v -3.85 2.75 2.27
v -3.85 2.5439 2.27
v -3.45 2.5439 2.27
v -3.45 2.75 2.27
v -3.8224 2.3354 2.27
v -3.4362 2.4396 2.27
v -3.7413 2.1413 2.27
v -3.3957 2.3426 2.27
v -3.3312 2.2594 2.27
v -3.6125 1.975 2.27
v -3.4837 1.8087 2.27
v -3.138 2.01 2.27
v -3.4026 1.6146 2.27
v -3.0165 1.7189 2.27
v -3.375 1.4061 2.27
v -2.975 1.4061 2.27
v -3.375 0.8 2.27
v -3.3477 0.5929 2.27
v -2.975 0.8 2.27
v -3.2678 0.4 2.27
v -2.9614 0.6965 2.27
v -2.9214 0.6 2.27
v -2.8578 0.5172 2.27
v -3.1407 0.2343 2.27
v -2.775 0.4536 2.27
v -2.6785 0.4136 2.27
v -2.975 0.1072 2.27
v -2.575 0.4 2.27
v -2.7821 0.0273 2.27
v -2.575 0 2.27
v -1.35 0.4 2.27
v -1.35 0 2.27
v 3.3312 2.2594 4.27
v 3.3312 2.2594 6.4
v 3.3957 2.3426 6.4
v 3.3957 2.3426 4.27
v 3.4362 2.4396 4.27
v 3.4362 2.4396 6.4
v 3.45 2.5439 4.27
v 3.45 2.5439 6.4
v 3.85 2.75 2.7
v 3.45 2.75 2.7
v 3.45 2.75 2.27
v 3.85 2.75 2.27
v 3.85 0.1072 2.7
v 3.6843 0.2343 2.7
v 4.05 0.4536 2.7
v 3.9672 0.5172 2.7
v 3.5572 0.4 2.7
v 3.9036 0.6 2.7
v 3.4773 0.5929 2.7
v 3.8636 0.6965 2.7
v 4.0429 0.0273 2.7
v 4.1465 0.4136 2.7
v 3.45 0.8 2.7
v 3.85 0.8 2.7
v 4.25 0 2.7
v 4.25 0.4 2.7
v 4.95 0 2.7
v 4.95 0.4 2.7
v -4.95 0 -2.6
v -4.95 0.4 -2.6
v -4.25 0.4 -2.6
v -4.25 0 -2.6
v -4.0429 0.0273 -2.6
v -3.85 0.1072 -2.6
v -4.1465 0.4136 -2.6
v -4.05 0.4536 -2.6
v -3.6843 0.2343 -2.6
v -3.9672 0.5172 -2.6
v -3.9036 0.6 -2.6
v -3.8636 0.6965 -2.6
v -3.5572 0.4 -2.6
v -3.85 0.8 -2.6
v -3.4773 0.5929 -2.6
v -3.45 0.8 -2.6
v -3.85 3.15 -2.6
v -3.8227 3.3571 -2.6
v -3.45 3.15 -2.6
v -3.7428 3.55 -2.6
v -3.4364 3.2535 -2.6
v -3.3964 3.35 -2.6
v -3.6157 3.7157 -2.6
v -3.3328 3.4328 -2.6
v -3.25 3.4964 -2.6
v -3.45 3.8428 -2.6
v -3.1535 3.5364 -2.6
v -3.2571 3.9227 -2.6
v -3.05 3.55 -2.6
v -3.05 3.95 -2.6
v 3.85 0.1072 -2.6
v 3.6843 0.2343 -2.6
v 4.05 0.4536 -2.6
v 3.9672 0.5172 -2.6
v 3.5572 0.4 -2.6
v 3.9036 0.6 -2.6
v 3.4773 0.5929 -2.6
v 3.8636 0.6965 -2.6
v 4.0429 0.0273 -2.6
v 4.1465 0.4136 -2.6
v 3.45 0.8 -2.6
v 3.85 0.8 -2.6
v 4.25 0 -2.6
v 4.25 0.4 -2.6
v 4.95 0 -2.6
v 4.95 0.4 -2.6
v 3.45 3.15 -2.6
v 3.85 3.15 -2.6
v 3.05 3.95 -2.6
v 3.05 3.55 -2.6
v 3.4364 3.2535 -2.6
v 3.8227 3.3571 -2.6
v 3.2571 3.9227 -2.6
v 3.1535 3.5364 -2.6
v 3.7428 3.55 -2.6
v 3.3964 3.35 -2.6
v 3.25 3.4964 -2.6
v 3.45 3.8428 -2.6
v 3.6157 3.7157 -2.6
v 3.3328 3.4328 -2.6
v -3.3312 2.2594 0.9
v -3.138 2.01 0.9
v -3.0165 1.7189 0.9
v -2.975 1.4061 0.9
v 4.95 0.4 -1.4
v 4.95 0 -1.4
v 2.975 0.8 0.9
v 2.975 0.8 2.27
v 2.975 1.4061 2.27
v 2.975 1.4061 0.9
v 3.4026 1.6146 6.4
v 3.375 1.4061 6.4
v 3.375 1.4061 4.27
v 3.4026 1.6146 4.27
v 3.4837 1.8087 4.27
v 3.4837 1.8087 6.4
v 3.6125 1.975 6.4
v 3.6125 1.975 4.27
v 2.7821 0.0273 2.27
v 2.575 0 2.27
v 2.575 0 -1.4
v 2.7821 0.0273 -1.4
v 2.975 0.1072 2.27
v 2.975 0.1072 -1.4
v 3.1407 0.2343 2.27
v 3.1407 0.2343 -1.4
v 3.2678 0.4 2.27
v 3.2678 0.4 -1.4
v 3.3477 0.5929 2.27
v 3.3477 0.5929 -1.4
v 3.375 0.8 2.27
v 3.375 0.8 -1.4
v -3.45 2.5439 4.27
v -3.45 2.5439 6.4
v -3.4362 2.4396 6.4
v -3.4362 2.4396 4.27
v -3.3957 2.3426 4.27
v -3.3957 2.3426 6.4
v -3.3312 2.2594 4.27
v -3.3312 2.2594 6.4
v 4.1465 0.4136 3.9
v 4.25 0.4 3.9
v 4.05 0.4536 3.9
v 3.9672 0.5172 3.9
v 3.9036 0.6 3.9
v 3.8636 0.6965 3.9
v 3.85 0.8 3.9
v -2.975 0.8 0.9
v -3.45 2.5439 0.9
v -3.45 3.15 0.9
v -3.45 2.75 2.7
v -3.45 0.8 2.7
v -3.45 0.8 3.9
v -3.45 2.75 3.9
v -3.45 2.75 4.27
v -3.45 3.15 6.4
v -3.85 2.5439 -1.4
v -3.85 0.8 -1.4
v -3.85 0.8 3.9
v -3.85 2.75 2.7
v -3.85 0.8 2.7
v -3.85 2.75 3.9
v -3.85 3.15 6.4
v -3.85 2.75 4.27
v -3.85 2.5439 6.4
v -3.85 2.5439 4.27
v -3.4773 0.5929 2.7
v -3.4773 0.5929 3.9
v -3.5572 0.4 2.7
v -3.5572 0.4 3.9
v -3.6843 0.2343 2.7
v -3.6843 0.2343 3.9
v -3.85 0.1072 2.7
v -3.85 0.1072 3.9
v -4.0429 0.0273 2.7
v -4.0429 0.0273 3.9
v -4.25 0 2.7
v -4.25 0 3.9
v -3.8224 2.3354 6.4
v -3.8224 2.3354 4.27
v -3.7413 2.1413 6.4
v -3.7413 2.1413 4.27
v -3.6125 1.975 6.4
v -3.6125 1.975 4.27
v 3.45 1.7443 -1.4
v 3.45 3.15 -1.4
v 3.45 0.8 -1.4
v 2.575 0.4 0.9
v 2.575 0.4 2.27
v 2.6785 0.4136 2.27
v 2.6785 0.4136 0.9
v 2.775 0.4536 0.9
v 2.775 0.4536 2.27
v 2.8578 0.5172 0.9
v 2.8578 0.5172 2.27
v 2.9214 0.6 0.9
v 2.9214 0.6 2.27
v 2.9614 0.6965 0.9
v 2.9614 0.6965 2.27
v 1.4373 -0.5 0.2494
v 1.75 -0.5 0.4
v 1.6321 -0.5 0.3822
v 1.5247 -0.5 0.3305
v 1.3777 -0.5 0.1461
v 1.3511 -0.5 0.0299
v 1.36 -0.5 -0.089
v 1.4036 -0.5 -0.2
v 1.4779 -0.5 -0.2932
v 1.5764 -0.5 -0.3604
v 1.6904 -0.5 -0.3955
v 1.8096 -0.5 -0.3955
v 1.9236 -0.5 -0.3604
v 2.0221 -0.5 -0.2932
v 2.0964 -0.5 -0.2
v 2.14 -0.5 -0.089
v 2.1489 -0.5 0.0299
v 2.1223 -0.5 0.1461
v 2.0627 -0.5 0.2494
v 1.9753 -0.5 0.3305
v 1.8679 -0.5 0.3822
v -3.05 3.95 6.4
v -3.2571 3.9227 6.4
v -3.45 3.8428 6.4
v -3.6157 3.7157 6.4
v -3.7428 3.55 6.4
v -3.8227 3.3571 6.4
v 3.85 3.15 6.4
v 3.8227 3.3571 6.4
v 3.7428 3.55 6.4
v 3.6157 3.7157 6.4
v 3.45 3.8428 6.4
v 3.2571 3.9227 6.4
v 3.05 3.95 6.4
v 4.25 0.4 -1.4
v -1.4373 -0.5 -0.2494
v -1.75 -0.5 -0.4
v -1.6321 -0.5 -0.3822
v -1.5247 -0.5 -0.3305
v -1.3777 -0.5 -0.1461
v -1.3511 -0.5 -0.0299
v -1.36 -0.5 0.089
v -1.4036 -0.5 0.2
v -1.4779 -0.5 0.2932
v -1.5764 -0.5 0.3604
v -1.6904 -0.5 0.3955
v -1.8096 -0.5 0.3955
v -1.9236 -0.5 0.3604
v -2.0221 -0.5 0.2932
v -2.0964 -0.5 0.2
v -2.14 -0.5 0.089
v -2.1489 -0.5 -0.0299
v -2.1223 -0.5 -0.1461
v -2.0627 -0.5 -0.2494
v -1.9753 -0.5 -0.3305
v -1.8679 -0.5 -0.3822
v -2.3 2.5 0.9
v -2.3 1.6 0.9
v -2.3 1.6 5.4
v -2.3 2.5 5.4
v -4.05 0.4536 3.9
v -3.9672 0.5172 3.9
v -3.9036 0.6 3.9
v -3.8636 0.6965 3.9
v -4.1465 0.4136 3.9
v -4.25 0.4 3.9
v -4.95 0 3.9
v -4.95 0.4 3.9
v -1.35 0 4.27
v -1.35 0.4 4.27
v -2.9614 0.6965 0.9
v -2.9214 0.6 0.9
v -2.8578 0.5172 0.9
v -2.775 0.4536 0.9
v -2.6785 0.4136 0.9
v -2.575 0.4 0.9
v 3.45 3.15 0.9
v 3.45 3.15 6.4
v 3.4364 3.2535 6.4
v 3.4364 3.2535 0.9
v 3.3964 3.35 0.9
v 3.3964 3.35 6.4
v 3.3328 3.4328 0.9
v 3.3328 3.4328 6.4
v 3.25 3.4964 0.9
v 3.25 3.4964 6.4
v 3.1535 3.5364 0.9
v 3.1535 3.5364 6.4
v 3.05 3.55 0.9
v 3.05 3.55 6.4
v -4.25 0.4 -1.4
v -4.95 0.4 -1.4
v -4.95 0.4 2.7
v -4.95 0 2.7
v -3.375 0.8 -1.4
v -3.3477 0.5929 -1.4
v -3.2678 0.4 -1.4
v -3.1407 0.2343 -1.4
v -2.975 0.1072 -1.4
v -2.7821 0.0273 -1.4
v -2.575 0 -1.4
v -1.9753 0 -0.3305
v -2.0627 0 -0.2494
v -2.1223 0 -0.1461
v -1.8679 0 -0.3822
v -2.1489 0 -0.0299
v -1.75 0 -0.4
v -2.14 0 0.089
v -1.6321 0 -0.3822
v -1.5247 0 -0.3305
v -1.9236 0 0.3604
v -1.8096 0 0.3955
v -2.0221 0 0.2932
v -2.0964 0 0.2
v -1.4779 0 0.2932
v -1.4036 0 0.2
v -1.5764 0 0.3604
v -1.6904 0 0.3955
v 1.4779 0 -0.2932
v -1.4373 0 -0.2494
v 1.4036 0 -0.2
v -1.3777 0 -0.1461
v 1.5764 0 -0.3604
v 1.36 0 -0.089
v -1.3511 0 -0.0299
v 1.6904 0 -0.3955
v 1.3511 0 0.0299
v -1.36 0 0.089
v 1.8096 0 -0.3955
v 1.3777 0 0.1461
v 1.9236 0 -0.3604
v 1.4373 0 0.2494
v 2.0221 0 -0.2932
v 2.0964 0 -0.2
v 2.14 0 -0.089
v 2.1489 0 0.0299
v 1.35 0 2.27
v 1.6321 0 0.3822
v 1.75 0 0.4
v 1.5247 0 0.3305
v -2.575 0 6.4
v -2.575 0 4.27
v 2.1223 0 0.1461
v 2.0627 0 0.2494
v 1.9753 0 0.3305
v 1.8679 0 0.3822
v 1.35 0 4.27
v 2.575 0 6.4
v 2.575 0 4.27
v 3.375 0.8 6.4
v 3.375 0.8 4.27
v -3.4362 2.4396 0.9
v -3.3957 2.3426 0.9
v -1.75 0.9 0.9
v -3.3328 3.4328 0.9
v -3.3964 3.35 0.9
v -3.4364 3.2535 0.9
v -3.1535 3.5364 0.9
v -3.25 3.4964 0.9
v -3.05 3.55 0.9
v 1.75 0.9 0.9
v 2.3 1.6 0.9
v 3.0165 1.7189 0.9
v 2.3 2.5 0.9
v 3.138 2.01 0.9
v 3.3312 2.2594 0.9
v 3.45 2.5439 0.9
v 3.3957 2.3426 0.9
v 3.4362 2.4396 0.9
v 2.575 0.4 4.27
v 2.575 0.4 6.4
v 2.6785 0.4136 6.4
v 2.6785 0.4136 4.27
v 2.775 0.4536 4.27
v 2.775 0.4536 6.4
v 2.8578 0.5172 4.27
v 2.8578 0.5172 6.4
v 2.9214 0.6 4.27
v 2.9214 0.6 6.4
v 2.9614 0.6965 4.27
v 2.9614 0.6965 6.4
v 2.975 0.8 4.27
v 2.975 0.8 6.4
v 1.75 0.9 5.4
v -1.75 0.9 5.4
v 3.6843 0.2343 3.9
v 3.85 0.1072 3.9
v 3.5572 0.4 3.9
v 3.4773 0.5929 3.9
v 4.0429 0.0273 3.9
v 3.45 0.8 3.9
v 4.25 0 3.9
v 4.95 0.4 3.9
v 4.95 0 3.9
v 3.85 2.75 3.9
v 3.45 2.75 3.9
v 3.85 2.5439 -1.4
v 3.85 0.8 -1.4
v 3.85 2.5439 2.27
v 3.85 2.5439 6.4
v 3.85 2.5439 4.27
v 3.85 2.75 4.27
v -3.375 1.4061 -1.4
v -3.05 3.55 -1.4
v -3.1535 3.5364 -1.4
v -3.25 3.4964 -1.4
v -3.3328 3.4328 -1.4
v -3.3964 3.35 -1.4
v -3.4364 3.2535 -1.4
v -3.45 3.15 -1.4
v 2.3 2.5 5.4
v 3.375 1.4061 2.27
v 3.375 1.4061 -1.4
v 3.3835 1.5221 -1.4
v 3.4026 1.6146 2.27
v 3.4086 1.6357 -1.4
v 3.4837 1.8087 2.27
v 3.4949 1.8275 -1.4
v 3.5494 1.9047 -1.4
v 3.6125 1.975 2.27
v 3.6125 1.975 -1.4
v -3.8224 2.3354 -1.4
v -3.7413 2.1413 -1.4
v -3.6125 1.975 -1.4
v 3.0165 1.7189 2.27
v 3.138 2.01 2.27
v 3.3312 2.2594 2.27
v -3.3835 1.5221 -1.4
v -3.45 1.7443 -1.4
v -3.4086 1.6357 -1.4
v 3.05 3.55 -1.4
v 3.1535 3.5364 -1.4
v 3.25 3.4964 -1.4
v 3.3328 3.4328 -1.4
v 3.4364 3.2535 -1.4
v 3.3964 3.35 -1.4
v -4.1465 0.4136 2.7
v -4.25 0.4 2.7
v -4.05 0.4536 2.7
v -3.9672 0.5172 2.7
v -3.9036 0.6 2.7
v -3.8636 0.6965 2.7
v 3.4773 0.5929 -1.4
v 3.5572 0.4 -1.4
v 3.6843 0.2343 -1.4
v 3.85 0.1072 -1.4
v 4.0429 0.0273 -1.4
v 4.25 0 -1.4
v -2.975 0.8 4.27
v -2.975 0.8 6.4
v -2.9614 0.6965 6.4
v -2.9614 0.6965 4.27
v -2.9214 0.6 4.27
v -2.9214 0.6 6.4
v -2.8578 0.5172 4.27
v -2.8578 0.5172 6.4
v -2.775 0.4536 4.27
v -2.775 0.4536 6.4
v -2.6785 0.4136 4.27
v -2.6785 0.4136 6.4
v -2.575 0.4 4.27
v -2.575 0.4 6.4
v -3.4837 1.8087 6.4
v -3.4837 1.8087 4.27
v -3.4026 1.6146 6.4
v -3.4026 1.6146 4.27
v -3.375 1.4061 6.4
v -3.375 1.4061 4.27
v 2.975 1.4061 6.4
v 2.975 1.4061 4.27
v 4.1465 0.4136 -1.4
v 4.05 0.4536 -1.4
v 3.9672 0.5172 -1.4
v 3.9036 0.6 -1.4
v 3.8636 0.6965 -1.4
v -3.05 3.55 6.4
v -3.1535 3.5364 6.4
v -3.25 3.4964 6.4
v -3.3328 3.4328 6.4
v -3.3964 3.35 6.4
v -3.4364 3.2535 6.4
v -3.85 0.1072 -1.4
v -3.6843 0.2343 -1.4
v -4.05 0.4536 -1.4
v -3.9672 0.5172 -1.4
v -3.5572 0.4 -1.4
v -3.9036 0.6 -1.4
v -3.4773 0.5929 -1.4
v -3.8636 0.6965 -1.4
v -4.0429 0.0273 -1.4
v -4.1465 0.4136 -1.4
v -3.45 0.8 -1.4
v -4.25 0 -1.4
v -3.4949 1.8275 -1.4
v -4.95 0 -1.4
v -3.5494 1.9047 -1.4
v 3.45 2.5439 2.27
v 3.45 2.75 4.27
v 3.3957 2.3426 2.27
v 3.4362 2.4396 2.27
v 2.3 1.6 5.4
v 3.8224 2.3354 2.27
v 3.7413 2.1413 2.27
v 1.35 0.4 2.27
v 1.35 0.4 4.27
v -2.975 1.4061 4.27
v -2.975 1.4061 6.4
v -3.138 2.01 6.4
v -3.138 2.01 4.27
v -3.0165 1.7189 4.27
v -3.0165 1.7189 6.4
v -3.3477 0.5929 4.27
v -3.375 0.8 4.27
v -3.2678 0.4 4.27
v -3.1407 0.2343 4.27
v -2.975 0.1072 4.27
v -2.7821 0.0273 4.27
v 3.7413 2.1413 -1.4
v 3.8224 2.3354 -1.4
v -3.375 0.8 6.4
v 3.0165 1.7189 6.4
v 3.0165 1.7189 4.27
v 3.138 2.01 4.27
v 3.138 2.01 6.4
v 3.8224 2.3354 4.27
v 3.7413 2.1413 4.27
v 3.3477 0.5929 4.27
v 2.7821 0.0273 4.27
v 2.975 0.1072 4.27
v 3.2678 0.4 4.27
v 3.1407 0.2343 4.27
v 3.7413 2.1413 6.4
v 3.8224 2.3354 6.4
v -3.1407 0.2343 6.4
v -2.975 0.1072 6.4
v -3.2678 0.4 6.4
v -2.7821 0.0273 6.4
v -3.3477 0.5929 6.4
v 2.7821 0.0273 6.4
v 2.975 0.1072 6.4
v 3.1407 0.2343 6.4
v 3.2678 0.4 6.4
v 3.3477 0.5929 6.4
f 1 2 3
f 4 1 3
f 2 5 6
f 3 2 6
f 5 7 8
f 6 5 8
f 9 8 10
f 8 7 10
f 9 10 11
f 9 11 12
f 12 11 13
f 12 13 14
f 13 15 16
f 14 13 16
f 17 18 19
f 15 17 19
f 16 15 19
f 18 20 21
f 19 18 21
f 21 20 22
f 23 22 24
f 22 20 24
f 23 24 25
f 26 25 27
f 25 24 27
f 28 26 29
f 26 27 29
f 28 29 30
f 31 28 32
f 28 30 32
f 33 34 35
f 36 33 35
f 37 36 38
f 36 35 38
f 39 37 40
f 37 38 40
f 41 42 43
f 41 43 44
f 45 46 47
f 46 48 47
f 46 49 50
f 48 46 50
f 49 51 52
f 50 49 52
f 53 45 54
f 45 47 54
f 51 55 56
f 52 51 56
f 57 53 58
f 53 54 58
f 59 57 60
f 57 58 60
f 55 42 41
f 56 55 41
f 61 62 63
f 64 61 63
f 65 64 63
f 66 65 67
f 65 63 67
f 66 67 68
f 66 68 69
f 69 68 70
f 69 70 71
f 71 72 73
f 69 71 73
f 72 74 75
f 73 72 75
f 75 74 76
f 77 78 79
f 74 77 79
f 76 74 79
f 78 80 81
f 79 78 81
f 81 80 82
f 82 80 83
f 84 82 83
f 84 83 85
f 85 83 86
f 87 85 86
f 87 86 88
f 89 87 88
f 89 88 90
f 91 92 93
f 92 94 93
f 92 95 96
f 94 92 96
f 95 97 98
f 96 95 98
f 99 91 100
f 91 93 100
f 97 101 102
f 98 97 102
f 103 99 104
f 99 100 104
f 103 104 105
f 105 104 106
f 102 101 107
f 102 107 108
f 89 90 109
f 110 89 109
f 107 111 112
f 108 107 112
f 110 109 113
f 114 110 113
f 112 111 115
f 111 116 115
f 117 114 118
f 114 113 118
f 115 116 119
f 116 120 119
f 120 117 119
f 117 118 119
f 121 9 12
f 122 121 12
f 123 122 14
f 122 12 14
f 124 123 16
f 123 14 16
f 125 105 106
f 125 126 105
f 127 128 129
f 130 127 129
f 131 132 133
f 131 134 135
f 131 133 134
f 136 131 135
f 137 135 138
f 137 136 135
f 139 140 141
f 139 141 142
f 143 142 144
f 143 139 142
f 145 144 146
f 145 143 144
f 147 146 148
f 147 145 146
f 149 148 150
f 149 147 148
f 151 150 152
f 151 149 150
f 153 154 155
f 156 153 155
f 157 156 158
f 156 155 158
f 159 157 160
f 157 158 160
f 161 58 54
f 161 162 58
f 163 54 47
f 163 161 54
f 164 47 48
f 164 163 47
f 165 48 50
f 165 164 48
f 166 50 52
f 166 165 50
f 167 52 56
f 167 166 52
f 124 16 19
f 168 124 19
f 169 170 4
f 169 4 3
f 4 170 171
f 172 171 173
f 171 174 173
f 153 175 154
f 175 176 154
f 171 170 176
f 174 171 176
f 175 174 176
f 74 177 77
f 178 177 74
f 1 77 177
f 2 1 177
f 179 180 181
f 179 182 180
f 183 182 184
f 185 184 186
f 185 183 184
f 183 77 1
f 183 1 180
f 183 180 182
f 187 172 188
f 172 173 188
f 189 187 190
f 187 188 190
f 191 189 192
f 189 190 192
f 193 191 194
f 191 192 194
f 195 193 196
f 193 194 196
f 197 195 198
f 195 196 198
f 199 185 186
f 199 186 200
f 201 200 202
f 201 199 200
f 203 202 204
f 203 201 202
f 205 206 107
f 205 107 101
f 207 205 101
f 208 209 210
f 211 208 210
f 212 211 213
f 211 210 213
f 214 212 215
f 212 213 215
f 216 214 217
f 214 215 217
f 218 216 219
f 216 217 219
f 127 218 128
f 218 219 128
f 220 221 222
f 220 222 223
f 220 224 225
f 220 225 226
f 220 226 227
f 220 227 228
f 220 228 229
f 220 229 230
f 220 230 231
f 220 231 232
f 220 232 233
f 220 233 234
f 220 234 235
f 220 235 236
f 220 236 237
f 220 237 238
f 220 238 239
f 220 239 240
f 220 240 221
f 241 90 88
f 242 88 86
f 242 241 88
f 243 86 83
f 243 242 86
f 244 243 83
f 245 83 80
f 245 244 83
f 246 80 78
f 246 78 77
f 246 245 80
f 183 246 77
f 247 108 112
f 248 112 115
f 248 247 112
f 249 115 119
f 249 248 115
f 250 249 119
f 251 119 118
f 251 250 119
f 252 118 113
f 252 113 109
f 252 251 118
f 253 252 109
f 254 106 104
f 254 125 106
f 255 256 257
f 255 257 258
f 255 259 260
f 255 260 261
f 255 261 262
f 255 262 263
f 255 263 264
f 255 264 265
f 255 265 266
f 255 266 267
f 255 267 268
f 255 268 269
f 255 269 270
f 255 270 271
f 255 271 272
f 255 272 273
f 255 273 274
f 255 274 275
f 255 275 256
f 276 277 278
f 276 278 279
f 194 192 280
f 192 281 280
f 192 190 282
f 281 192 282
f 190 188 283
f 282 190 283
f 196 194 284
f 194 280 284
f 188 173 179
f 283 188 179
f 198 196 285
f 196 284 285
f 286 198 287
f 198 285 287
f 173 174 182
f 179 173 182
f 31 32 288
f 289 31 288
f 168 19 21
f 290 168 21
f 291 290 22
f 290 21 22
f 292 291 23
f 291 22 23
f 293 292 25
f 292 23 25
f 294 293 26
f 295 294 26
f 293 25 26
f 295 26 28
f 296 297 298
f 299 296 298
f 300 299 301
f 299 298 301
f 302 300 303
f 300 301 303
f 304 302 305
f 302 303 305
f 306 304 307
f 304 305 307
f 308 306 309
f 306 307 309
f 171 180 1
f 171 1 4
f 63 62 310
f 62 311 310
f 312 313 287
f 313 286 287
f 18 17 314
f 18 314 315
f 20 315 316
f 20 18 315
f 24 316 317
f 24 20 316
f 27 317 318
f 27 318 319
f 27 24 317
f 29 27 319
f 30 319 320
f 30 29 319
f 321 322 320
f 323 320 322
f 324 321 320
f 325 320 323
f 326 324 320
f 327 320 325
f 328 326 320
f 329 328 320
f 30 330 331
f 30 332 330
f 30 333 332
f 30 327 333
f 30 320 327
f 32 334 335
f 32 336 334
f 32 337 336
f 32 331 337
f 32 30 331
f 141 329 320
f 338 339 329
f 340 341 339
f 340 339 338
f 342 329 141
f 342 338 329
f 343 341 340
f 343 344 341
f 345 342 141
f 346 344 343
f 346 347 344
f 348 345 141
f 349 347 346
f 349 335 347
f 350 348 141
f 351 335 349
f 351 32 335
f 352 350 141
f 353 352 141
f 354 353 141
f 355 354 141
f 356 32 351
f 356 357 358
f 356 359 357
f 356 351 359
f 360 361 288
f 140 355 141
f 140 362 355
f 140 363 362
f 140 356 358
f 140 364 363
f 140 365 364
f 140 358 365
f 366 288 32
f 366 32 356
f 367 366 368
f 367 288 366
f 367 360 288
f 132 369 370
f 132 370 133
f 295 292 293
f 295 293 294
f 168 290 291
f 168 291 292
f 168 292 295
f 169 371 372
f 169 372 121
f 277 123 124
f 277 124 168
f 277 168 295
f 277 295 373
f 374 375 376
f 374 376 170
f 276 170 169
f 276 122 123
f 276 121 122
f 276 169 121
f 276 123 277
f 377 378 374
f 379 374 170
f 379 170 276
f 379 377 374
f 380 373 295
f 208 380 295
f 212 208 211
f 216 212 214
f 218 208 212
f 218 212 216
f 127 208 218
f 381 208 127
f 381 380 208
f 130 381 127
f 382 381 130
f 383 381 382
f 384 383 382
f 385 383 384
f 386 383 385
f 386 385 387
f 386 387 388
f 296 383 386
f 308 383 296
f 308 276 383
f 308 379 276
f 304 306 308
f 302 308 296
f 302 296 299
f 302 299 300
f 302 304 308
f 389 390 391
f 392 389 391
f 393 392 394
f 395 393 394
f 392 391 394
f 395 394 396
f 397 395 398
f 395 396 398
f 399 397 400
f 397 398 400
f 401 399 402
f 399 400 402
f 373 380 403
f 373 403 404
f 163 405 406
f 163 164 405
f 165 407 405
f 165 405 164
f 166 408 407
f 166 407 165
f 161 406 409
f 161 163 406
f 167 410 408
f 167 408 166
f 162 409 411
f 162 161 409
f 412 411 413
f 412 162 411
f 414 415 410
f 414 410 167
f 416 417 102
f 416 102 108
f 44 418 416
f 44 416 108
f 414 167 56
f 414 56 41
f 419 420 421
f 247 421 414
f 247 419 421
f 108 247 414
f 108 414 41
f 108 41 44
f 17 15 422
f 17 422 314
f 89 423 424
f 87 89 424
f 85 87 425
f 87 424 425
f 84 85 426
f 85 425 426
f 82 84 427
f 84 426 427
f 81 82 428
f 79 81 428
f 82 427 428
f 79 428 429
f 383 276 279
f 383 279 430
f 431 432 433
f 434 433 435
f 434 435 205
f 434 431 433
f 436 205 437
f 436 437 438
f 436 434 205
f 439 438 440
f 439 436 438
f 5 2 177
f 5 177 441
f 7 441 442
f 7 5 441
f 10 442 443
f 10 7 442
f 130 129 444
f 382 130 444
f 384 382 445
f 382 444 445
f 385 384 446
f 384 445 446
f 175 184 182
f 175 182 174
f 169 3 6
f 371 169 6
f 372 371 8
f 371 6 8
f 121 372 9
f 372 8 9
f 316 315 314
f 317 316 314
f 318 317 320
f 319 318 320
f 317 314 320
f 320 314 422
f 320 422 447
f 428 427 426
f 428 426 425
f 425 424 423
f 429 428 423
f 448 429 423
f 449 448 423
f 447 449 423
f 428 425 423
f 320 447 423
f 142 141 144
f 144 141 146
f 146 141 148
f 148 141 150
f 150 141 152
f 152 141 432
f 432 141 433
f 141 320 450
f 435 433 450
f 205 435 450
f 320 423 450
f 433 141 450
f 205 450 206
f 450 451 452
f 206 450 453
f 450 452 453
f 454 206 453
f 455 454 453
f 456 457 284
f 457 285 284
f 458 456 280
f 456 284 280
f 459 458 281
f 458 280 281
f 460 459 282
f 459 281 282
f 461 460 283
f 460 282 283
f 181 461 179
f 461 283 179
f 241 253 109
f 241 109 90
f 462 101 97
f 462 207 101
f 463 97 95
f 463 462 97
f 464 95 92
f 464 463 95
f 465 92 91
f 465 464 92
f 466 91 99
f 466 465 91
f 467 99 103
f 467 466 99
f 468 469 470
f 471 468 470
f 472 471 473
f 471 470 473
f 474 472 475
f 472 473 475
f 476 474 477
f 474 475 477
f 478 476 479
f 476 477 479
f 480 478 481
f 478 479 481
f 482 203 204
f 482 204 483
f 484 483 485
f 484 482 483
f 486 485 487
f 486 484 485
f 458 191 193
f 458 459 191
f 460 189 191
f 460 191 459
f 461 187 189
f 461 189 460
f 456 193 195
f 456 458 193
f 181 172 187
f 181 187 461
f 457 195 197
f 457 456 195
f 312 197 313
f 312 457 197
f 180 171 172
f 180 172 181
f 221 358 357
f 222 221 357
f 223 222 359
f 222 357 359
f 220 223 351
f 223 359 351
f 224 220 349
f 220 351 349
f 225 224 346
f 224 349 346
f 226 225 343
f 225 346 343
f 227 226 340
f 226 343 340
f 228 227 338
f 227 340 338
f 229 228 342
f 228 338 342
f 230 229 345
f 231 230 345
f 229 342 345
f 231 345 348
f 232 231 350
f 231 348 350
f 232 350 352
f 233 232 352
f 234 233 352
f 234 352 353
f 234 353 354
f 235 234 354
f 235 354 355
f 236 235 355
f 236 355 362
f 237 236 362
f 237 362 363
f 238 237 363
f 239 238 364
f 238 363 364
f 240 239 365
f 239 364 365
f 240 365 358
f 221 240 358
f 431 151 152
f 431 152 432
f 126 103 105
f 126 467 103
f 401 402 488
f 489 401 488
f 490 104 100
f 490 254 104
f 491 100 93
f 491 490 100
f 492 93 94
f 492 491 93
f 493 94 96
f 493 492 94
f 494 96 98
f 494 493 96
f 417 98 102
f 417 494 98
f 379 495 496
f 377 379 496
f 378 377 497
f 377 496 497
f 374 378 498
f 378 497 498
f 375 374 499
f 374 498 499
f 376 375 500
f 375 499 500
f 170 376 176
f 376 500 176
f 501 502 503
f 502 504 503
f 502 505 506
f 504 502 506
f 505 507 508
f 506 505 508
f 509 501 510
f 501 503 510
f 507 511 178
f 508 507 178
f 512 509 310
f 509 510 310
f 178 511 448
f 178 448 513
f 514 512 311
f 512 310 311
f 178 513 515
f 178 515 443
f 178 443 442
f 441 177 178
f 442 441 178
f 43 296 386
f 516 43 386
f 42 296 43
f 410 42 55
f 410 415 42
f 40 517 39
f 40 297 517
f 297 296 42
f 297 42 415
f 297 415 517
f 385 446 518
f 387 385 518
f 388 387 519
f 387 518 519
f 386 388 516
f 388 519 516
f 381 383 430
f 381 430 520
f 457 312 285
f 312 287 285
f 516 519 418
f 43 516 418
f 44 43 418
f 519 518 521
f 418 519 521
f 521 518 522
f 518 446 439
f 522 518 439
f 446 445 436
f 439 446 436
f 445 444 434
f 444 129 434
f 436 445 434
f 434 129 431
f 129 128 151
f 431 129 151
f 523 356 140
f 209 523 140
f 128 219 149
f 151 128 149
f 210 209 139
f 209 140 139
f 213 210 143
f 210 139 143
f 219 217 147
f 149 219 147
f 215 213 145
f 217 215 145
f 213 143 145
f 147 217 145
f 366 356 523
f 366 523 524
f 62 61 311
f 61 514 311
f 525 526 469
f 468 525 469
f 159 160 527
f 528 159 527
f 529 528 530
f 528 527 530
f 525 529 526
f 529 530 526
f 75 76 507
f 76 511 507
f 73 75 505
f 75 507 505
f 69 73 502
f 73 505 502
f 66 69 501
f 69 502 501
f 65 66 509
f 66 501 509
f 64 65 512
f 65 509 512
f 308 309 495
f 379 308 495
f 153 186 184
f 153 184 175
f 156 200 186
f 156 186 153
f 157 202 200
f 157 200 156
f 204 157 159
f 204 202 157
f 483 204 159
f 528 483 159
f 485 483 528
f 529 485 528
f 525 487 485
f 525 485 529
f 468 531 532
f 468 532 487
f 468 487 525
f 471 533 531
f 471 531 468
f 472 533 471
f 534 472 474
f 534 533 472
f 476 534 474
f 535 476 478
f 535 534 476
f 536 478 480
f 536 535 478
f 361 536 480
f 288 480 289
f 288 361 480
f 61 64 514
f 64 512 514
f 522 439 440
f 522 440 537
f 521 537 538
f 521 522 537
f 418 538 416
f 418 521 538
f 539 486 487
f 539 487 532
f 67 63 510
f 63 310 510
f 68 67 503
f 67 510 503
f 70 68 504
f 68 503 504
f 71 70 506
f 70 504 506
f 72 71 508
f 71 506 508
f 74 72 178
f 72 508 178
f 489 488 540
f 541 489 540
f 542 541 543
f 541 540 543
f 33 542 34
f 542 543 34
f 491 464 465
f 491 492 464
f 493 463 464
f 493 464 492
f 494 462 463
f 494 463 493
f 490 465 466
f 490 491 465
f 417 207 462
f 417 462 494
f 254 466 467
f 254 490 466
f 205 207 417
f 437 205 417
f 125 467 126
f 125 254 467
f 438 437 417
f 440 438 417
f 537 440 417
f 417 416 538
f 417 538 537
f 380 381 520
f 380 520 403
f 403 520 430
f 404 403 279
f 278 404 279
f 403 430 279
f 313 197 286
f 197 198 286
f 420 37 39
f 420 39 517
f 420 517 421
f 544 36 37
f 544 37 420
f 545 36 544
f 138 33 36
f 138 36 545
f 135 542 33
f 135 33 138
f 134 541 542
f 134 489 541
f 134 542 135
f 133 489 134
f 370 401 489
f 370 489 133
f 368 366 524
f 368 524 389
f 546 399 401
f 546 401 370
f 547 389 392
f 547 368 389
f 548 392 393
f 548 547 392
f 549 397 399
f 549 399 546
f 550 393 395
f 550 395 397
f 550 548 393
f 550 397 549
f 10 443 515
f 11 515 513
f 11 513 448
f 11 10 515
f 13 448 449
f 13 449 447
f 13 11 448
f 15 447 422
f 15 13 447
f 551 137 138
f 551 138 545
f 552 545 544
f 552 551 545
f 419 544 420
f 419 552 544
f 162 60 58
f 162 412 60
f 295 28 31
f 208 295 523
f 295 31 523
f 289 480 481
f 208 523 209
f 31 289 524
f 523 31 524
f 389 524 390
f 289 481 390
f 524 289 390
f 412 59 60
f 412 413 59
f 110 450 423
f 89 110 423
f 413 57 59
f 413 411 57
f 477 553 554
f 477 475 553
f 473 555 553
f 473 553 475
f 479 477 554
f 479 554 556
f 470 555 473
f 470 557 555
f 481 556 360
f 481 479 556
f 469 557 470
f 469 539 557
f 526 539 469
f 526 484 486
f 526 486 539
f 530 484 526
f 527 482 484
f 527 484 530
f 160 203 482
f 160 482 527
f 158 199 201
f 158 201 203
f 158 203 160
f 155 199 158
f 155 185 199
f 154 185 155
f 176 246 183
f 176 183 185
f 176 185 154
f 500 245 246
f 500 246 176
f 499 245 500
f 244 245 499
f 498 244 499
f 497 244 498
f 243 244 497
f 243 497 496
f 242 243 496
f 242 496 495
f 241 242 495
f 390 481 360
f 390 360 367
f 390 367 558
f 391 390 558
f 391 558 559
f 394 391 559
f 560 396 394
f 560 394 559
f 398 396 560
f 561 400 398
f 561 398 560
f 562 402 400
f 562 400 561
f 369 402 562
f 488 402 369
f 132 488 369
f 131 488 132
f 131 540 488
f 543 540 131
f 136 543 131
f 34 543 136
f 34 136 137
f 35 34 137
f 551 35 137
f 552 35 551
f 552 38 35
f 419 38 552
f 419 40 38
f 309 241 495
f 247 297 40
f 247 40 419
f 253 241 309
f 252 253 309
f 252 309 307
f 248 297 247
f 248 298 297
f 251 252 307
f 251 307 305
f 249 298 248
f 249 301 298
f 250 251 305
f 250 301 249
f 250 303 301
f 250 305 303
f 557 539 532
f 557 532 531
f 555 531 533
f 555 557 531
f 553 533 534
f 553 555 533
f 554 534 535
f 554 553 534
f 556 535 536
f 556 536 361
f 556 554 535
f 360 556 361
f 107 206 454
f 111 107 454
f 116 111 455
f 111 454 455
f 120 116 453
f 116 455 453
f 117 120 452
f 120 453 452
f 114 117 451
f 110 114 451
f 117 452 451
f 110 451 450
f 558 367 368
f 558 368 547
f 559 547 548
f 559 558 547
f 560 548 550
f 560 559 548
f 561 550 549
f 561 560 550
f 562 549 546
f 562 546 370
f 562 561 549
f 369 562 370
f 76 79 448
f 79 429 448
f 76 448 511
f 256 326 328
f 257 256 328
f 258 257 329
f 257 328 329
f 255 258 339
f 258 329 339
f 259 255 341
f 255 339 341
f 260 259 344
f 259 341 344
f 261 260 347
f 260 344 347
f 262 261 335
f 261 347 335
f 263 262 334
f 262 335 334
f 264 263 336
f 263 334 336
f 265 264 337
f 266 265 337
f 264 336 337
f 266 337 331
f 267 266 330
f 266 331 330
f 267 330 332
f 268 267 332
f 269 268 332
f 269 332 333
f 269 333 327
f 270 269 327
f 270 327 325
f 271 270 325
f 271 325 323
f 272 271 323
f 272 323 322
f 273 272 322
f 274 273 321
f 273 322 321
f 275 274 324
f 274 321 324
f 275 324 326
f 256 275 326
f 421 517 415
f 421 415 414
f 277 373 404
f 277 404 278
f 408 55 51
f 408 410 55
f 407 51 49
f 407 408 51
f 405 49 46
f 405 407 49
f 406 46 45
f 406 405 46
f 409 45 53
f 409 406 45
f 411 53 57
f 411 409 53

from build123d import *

# Parameters (mm, degrees)
BODY_START       = 6.4
BODY_DEPTH       = 9
SKETCH2_W        = 2.5
SKETCH2_H        = 2
SKETCH2_W_2      = 7.7
SKETCH2_H_2      = 3.5
BODYCUT_DEPTH    = 2.75
FOOT1_DEPTH      = 0.6
FOOT2_DEPTH      = 0.6
CORE1_DEPTH      = 2.3
CORE2_DEPTH      = 4.5
SKETCH9_R        = 0.4
LOCATEPINS_DEPTH = 0.5


with BuildPart() as part:
    # Sketch1 → Body (new body)
    with BuildSketch(Plane.XY.offset(BODY_START)):
        with BuildLine():
            ThreePointArc((3.6125, 1.975), (3.788241153, 2.235632313), (3.85, 2.543853013))
            Line((3.85, 2.543853013), (3.85, 3.15))
            ThreePointArc((3.85, 3.15), (3.615685425, 3.715685425), (3.05, 3.95))
            Line((3.05, 3.95), (-3.05, 3.95))
            ThreePointArc((-3.05, 3.95), (-3.615685425, 3.715685425), (-3.85, 3.15))
            Line((-3.85, 3.15), (-3.85, 2.543853013))
            ThreePointArc((-3.85, 2.543853013), (-3.788241153, 2.235632313), (-3.6125, 1.975))
            ThreePointArc((-3.6125, 1.975), (-3.436758847, 1.714367687), (-3.375, 1.406146987))
            Line((-3.375, 1.406146987), (-3.375, 0.8))
            ThreePointArc((-3.375, 0.8), (-3.140685425, 0.234314575), (-2.575, 0))
            Line((-2.575, 0), (2.575, 0))
            ThreePointArc((2.575, 0), (3.140685425, 0.234314575), (3.375, 0.8))
            Line((3.375, 0.8), (3.375, 1.406146987))
            ThreePointArc((3.375, 1.406146987), (3.436758847, 1.714367687), (3.6125, 1.975))
        make_face()
        with BuildLine():
            ThreePointArc((3.33125, 2.259426506), (3.419120577, 2.389742663), (3.45, 2.543853013))
            Line((3.45, 2.543853013), (3.45, 3.15))
            ThreePointArc((3.45, 3.15), (3.332842712, 3.432842712), (3.05, 3.55))
            Line((3.05, 3.55), (-3.05, 3.55))
            ThreePointArc((-3.05, 3.55), (-3.332842712, 3.432842712), (-3.45, 3.15))
            Line((-3.45, 3.15), (-3.45, 2.543853013))
            ThreePointArc((-3.45, 2.543853013), (-3.419120577, 2.389742663), (-3.33125, 2.259426506))
            ThreePointArc((-3.33125, 2.259426506), (-3.06763827, 1.868478038), (-2.975, 1.406146987))
            Line((-2.975, 1.406146987), (-2.975, 0.8))
            ThreePointArc((-2.975, 0.8), (-2.857842712, 0.517157288), (-2.575, 0.4))
            Line((-2.575, 0.4), (2.575, 0.4))
            ThreePointArc((2.575, 0.4), (2.857842712, 0.517157288), (2.975, 0.8))
            Line((2.975, 0.8), (2.975, 1.406146987))
            ThreePointArc((2.975, 1.406146987), (3.06763827, 1.868478038), (3.33125, 2.259426506))
        make_face(mode=Mode.SUBTRACT)
    extrude(amount=-BODY_DEPTH)

    # Sketch2 → BodyCut (cut)
    with BuildSketch(Plane.XZ):
        with Locations((2.6, 3.27)):
            Rectangle(SKETCH2_W, SKETCH2_H)
        with Locations((0, -0.85)):
            Rectangle(SKETCH2_W_2, SKETCH2_H_2)
        with Locations((-2.6, 3.27)):
            Rectangle(SKETCH2_W, SKETCH2_H)
    extrude(amount=-BODYCUT_DEPTH, mode=Mode.SUBTRACT)

    # Sketch3 → Foot1 (add, symmetric)
    with BuildSketch(Plane.XY.offset(-2)):
        with BuildLine():
            Line((-3.45, 2.75), (-3.45, 0.8))
            ThreePointArc((-3.45, 0.8), (-3.684314575, 0.234314575), (-4.25, 0))
            Line((-4.25, 0), (-4.95, 0))
            Line((-4.95, 0), (-4.95, 0.4))
            Line((-4.95, 0.4), (-4.25, 0.4))
            ThreePointArc((-4.25, 0.4), (-3.967157288, 0.517157288), (-3.85, 0.8))
            Line((-3.85, 0.8), (-3.85, 2.75))
            Line((-3.85, 2.75), (-3.45, 2.75))
        make_face()
    foot1 = extrude(amount=FOOT1_DEPTH, both=True)

    # Sketch4 → Foot2 (add, symmetric)
    with BuildSketch(Plane.XY.offset(3.3)):
        with BuildLine():
            Line((-3.45, 2.75), (-3.45, 0.8))
            ThreePointArc((-3.45, 0.8), (-3.684314575, 0.234314575), (-4.25, 0))
            Line((-4.25, 0), (-4.95, 0))
            Line((-4.95, 0), (-4.95, 0.4))
            Line((-4.95, 0.4), (-4.25, 0.4))
            ThreePointArc((-4.25, 0.4), (-3.967157288, 0.517157288), (-3.85, 0.8))
            Line((-3.85, 0.8), (-3.85, 2.75))
            Line((-3.85, 2.75), (-3.45, 2.75))
        make_face()
    foot2 = extrude(amount=FOOT2_DEPTH, both=True)

    # Mirror1: Foot1, Foot2 across plane
    add(foot1.mirror(Plane(origin=(0, 0, 0), x_dir=(0, 0, 1), z_dir=(1, 0, 0))))
    add(foot2.mirror(Plane(origin=(0, 0, 0), x_dir=(0, 0, 1), z_dir=(1, 0, 0))))

    # Sketch6 → Core1 (add)
    with BuildSketch(Plane(origin=(0, 0, 0.9), x_dir=(-1, 0, 0), z_dir=(0, 0, -1))):
        with BuildLine():
            Line((3.45, 3.15), (3.45, 2.75))
            Line((3.45, 2.75), (3.85, 2.75))
            Line((3.85, 2.75), (3.85, 2.543853013))
            ThreePointArc((3.85, 2.543853013), (3.788241153, 2.235632313), (3.6125, 1.975))
            ThreePointArc((3.6125, 1.975), (3.436758847, 1.714367687), (3.375, 1.406146987))
            Line((3.375, 1.406146987), (3.375, 0.8))
            ThreePointArc((3.375, 0.8), (3.140685425, 0.234314575), (2.575, 0))
            Line((2.575, 0), (-2.575, 0))
            ThreePointArc((-2.575, 0), (-3.140685425, 0.234314575), (-3.375, 0.8))
            Line((-3.375, 0.8), (-3.375, 1.406146987))
            ThreePointArc((-3.375, 1.406146987), (-3.436758847, 1.714367687), (-3.6125, 1.975))
            ThreePointArc((-3.6125, 1.975), (-3.788241153, 2.235632313), (-3.85, 2.543853013))
            Line((-3.85, 2.543853013), (-3.85, 2.75))
            Line((-3.85, 2.75), (-3.45, 2.75))
            Line((-3.45, 2.75), (-3.45, 3.15))
            ThreePointArc((-3.45, 3.15), (-3.332842712, 3.432842712), (-3.05, 3.55))
            Line((-3.05, 3.55), (3.05, 3.55))
            ThreePointArc((3.05, 3.55), (3.332842712, 3.432842712), (3.45, 3.15))
        make_face()
    extrude(amount=CORE1_DEPTH)

    # Sketch7 → Core2 (add)
    with BuildSketch(Plane.XY.offset(0.9)):
        Polygon((-2.3, 2.5), (2.3, 2.5), (2.3, 1.6), (1.75, 0.9), (-1.75, 0.9), (-2.3, 1.6), align=None)
    extrude(amount=CORE2_DEPTH)

    # Sketch9 → LocatePins (add)
    with BuildSketch(Plane.XZ):
        with Locations(Location((-1.75, 0, 0), (0, 0, 270))):
            Circle(SKETCH9_R)
        with Locations(Location((1.75, 0, 0), (0, 0, 90))):
            Circle(SKETCH9_R)
    extrude(amount=LOCATEPINS_DEPTH)


solid = part.part
